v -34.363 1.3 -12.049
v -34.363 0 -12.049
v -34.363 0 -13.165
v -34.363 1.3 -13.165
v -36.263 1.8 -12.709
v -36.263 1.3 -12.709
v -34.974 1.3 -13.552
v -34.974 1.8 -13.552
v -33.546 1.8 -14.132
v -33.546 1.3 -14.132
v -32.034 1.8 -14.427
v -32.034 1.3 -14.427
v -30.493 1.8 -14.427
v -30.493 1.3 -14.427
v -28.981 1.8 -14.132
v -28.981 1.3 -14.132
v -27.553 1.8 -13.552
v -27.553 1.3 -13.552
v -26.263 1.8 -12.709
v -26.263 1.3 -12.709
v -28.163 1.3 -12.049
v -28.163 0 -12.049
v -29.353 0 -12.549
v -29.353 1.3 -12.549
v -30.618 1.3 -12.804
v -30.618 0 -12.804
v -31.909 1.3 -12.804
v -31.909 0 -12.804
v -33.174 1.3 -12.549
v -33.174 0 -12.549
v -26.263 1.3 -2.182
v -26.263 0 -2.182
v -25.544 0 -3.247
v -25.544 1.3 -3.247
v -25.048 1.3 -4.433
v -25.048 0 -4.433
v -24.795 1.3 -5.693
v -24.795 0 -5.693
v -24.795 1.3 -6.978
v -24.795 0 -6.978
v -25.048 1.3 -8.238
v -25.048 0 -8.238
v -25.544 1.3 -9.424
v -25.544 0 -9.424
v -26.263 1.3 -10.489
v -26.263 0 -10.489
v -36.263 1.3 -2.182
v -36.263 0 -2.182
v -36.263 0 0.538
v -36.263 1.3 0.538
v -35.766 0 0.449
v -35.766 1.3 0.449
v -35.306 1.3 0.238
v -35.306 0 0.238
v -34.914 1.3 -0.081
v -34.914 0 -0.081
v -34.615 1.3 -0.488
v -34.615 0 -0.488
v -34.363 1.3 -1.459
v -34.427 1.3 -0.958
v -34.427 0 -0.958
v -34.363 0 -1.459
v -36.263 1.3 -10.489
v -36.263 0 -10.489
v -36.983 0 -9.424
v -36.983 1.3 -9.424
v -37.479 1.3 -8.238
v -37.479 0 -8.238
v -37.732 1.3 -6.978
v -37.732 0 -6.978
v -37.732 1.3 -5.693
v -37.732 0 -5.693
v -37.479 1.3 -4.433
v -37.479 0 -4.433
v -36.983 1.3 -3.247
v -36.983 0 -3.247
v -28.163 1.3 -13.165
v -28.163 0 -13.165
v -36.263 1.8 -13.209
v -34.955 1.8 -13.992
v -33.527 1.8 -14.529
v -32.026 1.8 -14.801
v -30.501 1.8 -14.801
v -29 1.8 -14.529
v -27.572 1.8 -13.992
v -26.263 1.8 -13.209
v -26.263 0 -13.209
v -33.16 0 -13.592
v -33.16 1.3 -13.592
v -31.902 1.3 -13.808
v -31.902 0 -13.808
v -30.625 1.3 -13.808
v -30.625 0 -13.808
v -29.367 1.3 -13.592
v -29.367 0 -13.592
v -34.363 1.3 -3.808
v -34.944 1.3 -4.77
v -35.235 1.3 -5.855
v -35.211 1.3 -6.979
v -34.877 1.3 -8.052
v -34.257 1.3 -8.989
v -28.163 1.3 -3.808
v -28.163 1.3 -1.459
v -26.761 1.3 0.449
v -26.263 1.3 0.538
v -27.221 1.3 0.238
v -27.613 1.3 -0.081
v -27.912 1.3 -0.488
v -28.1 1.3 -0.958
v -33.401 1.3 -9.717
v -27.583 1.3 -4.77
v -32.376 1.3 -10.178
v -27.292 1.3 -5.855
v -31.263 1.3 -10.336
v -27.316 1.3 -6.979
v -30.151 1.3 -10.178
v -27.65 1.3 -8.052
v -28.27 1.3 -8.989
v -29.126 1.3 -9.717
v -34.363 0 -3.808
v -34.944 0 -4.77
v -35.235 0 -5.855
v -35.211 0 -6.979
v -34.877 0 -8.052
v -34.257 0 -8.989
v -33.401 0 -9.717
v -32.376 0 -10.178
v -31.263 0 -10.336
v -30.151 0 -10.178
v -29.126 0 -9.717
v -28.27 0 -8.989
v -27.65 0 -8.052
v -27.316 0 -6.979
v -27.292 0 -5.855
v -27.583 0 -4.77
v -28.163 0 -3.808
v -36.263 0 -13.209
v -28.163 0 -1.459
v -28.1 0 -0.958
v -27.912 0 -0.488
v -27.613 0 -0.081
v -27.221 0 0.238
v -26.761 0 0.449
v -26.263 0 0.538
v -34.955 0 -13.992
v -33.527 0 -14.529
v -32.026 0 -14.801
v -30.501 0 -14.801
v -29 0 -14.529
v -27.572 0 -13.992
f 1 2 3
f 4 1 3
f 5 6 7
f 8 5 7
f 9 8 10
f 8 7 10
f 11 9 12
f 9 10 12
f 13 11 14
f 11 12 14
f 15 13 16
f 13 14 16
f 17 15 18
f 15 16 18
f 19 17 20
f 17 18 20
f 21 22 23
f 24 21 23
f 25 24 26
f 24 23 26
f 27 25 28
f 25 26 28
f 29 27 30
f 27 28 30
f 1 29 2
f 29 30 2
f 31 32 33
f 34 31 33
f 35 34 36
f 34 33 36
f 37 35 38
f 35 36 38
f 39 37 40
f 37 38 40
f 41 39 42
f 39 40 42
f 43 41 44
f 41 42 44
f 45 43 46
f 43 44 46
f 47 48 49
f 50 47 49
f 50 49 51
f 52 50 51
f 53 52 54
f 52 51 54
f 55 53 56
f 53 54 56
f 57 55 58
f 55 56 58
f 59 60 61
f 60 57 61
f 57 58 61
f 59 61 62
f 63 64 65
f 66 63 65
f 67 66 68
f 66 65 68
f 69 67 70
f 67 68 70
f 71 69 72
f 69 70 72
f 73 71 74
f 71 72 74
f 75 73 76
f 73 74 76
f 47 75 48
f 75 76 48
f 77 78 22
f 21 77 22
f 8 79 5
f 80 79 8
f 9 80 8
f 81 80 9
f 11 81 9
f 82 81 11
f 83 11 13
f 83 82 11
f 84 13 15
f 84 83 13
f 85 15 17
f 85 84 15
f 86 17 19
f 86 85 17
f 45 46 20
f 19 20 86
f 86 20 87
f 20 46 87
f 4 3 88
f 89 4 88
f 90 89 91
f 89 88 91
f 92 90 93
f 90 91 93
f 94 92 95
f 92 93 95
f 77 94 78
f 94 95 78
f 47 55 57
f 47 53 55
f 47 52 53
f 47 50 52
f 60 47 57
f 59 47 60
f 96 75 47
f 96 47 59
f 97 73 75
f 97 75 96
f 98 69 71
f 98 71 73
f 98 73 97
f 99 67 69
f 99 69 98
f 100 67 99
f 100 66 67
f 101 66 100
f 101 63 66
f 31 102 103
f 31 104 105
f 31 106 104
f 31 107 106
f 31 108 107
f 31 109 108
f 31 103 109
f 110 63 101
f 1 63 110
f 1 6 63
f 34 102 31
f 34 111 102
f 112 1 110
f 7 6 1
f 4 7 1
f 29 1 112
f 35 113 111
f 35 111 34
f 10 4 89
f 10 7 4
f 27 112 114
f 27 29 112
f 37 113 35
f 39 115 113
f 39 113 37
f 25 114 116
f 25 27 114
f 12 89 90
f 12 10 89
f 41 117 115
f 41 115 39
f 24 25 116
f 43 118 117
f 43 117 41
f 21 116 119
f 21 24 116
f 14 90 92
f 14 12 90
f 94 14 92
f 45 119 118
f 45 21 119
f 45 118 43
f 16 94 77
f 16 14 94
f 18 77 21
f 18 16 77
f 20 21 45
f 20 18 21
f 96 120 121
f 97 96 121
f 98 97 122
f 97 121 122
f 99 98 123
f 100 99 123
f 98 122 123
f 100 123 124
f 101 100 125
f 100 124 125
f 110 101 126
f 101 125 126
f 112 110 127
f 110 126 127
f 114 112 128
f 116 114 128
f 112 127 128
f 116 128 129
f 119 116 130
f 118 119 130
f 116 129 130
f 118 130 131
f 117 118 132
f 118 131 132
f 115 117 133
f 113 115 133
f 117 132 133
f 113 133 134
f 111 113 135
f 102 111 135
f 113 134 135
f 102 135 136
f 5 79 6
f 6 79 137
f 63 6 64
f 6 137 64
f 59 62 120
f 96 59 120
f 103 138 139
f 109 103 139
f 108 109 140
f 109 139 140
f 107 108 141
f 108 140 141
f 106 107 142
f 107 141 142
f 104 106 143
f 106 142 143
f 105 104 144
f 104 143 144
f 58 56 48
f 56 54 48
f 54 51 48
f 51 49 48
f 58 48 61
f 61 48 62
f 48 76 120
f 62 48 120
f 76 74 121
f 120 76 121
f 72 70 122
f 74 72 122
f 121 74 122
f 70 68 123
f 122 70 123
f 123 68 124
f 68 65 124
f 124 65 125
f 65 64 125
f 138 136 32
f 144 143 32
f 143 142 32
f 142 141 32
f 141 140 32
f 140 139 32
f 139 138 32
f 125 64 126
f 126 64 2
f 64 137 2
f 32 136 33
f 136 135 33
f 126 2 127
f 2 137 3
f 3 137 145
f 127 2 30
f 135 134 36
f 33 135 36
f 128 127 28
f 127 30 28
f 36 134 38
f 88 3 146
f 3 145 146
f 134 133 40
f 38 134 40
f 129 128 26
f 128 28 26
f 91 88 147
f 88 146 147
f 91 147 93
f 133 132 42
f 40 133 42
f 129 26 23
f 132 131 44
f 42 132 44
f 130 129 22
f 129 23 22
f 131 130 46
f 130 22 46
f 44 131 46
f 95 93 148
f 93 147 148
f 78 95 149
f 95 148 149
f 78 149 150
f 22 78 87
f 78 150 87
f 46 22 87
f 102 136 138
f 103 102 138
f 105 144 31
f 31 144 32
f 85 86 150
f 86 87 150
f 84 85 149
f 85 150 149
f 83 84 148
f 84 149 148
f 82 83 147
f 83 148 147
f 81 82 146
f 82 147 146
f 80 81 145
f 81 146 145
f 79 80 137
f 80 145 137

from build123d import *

# Parameters (mm, degrees)
BOSS_EXTRUDE1_DEPTH = 1.3
FILLET1_R           = 2
BOSS_EXTRUDE2_DEPTH = 0.5


with BuildPart() as part:
    # Sketch1 → Boss-Extrude1 (new body)
    with BuildSketch(Plane(origin=(0, 0, 0), x_dir=(1, 0, 0), z_dir=(0, 1, 0))):
        with BuildLine():
            ThreePointArc((-34.363462402, 3.807782606), (-31.263462402, 10.335627538), (-28.163462402, 3.807782606))
            Line((-28.163462402, 3.807782606), (-28.163462402, -1.578916037))
            ThreePointArc((-28.163462402, -1.578916037), (-27.18017283, -1.119353768), (-26.263462402, -0.538236004))
            Line((-26.263462402, -0.538236004), (-26.263462402, 2.182315607))
            ThreePointArc((-26.263462402, 2.182315607), (-24.763462402, 6.335627538), (-26.263462402, 10.488939469))
            Line((-26.263462402, 10.488939469), (-26.263462402, 13.20949108))
            ThreePointArc((-26.263462402, 13.20949108), (-31.263462402, 14.835627538), (-36.263462402, 13.20949108))
            Line((-36.263462402, 13.20949108), (-36.263462402, 10.488939469))
            ThreePointArc((-36.263462402, 10.488939469), (-37.763462402, 6.335627538), (-36.263462402, 2.182315607))
            Line((-36.263462402, 2.182315607), (-36.263462402, -0.538236004))
            ThreePointArc((-36.263462402, -0.538236004), (-35.346751974, -1.119353768), (-34.363462402, -1.578916037))
            Line((-34.363462402, -1.578916037), (-34.363462402, 3.807782606))
        make_face()
        with BuildLine():
            Line((-28.163462402, 13.16497597), (-28.163462402, 12.048770281))
            ThreePointArc((-28.163462402, 12.048770281), (-31.263462402, 12.835627538), (-34.363462402, 12.048770281))
            Line((-34.363462402, 12.048770281), (-34.363462402, 13.16497597))
            ThreePointArc((-34.363462402, 13.16497597), (-31.263462402, 13.835627538), (-28.163462402, 13.16497597))
        make_face(mode=Mode.SUBTRACT)
    extrude(amount=BOSS_EXTRUDE1_DEPTH)

    # Fillet1
    # the kernel refuses this fillet: 2 mm, written as the material it takes off along each edge
    with BuildSketch(Plane(origin=(-34.363462402, -7.59544617, 1.578916037), x_dir=(-0.877056624193214, 0, -0.4803870085241726), z_dir=(0, 1, 0))) as fillet1_piece_1:
        with BuildLine():
            CenterArc((3.213614714, -1.703880534), FILLET1_R, 121.576665182, 87.134016017)
            Line((1.459501466, -2.664654551), (1.424419201, -2.683870031))
            Line((1.424419201, -2.683870031), (-0.035082265, -0.01921548))
            Line((-0.035082265, -0.01921548), (-0.005097263, 0.039673895))
            ThreePointArc((-0.005097263, 0.039673895), (1.083168377, 0.109297404), (2.145391194, 0.034077611))
            Line((2.145391194, 0.034077611), (2.166336754, 0))
        make_face()
    extrude(amount=16.49089234, mode=Mode.SUBTRACT)
    with BuildSketch(Plane(origin=(-28.163462402, -7.59544617, 1.578916037), x_dir=(0, 0, -1), z_dir=(0, 1, 0))) as fillet1_piece_2:
        with BuildLine():
            CenterArc((3.038178468, -2), FILLET1_R, 90, 87.134016017)
            Line((1.040680033, -1.9), (1.000730064, -1.898))
            ThreePointArc((1.000730064, -1.898), (0.424480004, -1.002505053), (-0.037244911, -0.014588235))
            Line((-0.037244911, -0.014588235), (0, 0.04))
            Line((0, 0.04), (3.038178468, 0.04))
            Line((3.038178468, 0.04), (3.038178468, 0))
        make_face()
    extrude(amount=16.49089234, mode=Mode.SUBTRACT)

    # Sketch2 → Boss-Extrude2 (add)
    with BuildSketch(Plane(origin=(0, 1.3, 0), x_dir=(1, 0, 0), z_dir=(0, 1, 0))):
        with BuildLine():
            Line((-26.263462402, 12.70949108), (-26.263462402, 13.20949108))
            ThreePointArc((-26.263462402, 13.20949108), (-31.263462402, 14.835627538), (-36.263462402, 13.20949108))
            Line((-36.263462402, 13.20949108), (-36.263462402, 12.70949108))
            ThreePointArc((-36.263462402, 12.70949108), (-31.263462402, 14.464493082), (-26.263462402, 12.70949108))
        make_face()
    extrude(amount=BOSS_EXTRUDE2_DEPTH)


solid = part.part
